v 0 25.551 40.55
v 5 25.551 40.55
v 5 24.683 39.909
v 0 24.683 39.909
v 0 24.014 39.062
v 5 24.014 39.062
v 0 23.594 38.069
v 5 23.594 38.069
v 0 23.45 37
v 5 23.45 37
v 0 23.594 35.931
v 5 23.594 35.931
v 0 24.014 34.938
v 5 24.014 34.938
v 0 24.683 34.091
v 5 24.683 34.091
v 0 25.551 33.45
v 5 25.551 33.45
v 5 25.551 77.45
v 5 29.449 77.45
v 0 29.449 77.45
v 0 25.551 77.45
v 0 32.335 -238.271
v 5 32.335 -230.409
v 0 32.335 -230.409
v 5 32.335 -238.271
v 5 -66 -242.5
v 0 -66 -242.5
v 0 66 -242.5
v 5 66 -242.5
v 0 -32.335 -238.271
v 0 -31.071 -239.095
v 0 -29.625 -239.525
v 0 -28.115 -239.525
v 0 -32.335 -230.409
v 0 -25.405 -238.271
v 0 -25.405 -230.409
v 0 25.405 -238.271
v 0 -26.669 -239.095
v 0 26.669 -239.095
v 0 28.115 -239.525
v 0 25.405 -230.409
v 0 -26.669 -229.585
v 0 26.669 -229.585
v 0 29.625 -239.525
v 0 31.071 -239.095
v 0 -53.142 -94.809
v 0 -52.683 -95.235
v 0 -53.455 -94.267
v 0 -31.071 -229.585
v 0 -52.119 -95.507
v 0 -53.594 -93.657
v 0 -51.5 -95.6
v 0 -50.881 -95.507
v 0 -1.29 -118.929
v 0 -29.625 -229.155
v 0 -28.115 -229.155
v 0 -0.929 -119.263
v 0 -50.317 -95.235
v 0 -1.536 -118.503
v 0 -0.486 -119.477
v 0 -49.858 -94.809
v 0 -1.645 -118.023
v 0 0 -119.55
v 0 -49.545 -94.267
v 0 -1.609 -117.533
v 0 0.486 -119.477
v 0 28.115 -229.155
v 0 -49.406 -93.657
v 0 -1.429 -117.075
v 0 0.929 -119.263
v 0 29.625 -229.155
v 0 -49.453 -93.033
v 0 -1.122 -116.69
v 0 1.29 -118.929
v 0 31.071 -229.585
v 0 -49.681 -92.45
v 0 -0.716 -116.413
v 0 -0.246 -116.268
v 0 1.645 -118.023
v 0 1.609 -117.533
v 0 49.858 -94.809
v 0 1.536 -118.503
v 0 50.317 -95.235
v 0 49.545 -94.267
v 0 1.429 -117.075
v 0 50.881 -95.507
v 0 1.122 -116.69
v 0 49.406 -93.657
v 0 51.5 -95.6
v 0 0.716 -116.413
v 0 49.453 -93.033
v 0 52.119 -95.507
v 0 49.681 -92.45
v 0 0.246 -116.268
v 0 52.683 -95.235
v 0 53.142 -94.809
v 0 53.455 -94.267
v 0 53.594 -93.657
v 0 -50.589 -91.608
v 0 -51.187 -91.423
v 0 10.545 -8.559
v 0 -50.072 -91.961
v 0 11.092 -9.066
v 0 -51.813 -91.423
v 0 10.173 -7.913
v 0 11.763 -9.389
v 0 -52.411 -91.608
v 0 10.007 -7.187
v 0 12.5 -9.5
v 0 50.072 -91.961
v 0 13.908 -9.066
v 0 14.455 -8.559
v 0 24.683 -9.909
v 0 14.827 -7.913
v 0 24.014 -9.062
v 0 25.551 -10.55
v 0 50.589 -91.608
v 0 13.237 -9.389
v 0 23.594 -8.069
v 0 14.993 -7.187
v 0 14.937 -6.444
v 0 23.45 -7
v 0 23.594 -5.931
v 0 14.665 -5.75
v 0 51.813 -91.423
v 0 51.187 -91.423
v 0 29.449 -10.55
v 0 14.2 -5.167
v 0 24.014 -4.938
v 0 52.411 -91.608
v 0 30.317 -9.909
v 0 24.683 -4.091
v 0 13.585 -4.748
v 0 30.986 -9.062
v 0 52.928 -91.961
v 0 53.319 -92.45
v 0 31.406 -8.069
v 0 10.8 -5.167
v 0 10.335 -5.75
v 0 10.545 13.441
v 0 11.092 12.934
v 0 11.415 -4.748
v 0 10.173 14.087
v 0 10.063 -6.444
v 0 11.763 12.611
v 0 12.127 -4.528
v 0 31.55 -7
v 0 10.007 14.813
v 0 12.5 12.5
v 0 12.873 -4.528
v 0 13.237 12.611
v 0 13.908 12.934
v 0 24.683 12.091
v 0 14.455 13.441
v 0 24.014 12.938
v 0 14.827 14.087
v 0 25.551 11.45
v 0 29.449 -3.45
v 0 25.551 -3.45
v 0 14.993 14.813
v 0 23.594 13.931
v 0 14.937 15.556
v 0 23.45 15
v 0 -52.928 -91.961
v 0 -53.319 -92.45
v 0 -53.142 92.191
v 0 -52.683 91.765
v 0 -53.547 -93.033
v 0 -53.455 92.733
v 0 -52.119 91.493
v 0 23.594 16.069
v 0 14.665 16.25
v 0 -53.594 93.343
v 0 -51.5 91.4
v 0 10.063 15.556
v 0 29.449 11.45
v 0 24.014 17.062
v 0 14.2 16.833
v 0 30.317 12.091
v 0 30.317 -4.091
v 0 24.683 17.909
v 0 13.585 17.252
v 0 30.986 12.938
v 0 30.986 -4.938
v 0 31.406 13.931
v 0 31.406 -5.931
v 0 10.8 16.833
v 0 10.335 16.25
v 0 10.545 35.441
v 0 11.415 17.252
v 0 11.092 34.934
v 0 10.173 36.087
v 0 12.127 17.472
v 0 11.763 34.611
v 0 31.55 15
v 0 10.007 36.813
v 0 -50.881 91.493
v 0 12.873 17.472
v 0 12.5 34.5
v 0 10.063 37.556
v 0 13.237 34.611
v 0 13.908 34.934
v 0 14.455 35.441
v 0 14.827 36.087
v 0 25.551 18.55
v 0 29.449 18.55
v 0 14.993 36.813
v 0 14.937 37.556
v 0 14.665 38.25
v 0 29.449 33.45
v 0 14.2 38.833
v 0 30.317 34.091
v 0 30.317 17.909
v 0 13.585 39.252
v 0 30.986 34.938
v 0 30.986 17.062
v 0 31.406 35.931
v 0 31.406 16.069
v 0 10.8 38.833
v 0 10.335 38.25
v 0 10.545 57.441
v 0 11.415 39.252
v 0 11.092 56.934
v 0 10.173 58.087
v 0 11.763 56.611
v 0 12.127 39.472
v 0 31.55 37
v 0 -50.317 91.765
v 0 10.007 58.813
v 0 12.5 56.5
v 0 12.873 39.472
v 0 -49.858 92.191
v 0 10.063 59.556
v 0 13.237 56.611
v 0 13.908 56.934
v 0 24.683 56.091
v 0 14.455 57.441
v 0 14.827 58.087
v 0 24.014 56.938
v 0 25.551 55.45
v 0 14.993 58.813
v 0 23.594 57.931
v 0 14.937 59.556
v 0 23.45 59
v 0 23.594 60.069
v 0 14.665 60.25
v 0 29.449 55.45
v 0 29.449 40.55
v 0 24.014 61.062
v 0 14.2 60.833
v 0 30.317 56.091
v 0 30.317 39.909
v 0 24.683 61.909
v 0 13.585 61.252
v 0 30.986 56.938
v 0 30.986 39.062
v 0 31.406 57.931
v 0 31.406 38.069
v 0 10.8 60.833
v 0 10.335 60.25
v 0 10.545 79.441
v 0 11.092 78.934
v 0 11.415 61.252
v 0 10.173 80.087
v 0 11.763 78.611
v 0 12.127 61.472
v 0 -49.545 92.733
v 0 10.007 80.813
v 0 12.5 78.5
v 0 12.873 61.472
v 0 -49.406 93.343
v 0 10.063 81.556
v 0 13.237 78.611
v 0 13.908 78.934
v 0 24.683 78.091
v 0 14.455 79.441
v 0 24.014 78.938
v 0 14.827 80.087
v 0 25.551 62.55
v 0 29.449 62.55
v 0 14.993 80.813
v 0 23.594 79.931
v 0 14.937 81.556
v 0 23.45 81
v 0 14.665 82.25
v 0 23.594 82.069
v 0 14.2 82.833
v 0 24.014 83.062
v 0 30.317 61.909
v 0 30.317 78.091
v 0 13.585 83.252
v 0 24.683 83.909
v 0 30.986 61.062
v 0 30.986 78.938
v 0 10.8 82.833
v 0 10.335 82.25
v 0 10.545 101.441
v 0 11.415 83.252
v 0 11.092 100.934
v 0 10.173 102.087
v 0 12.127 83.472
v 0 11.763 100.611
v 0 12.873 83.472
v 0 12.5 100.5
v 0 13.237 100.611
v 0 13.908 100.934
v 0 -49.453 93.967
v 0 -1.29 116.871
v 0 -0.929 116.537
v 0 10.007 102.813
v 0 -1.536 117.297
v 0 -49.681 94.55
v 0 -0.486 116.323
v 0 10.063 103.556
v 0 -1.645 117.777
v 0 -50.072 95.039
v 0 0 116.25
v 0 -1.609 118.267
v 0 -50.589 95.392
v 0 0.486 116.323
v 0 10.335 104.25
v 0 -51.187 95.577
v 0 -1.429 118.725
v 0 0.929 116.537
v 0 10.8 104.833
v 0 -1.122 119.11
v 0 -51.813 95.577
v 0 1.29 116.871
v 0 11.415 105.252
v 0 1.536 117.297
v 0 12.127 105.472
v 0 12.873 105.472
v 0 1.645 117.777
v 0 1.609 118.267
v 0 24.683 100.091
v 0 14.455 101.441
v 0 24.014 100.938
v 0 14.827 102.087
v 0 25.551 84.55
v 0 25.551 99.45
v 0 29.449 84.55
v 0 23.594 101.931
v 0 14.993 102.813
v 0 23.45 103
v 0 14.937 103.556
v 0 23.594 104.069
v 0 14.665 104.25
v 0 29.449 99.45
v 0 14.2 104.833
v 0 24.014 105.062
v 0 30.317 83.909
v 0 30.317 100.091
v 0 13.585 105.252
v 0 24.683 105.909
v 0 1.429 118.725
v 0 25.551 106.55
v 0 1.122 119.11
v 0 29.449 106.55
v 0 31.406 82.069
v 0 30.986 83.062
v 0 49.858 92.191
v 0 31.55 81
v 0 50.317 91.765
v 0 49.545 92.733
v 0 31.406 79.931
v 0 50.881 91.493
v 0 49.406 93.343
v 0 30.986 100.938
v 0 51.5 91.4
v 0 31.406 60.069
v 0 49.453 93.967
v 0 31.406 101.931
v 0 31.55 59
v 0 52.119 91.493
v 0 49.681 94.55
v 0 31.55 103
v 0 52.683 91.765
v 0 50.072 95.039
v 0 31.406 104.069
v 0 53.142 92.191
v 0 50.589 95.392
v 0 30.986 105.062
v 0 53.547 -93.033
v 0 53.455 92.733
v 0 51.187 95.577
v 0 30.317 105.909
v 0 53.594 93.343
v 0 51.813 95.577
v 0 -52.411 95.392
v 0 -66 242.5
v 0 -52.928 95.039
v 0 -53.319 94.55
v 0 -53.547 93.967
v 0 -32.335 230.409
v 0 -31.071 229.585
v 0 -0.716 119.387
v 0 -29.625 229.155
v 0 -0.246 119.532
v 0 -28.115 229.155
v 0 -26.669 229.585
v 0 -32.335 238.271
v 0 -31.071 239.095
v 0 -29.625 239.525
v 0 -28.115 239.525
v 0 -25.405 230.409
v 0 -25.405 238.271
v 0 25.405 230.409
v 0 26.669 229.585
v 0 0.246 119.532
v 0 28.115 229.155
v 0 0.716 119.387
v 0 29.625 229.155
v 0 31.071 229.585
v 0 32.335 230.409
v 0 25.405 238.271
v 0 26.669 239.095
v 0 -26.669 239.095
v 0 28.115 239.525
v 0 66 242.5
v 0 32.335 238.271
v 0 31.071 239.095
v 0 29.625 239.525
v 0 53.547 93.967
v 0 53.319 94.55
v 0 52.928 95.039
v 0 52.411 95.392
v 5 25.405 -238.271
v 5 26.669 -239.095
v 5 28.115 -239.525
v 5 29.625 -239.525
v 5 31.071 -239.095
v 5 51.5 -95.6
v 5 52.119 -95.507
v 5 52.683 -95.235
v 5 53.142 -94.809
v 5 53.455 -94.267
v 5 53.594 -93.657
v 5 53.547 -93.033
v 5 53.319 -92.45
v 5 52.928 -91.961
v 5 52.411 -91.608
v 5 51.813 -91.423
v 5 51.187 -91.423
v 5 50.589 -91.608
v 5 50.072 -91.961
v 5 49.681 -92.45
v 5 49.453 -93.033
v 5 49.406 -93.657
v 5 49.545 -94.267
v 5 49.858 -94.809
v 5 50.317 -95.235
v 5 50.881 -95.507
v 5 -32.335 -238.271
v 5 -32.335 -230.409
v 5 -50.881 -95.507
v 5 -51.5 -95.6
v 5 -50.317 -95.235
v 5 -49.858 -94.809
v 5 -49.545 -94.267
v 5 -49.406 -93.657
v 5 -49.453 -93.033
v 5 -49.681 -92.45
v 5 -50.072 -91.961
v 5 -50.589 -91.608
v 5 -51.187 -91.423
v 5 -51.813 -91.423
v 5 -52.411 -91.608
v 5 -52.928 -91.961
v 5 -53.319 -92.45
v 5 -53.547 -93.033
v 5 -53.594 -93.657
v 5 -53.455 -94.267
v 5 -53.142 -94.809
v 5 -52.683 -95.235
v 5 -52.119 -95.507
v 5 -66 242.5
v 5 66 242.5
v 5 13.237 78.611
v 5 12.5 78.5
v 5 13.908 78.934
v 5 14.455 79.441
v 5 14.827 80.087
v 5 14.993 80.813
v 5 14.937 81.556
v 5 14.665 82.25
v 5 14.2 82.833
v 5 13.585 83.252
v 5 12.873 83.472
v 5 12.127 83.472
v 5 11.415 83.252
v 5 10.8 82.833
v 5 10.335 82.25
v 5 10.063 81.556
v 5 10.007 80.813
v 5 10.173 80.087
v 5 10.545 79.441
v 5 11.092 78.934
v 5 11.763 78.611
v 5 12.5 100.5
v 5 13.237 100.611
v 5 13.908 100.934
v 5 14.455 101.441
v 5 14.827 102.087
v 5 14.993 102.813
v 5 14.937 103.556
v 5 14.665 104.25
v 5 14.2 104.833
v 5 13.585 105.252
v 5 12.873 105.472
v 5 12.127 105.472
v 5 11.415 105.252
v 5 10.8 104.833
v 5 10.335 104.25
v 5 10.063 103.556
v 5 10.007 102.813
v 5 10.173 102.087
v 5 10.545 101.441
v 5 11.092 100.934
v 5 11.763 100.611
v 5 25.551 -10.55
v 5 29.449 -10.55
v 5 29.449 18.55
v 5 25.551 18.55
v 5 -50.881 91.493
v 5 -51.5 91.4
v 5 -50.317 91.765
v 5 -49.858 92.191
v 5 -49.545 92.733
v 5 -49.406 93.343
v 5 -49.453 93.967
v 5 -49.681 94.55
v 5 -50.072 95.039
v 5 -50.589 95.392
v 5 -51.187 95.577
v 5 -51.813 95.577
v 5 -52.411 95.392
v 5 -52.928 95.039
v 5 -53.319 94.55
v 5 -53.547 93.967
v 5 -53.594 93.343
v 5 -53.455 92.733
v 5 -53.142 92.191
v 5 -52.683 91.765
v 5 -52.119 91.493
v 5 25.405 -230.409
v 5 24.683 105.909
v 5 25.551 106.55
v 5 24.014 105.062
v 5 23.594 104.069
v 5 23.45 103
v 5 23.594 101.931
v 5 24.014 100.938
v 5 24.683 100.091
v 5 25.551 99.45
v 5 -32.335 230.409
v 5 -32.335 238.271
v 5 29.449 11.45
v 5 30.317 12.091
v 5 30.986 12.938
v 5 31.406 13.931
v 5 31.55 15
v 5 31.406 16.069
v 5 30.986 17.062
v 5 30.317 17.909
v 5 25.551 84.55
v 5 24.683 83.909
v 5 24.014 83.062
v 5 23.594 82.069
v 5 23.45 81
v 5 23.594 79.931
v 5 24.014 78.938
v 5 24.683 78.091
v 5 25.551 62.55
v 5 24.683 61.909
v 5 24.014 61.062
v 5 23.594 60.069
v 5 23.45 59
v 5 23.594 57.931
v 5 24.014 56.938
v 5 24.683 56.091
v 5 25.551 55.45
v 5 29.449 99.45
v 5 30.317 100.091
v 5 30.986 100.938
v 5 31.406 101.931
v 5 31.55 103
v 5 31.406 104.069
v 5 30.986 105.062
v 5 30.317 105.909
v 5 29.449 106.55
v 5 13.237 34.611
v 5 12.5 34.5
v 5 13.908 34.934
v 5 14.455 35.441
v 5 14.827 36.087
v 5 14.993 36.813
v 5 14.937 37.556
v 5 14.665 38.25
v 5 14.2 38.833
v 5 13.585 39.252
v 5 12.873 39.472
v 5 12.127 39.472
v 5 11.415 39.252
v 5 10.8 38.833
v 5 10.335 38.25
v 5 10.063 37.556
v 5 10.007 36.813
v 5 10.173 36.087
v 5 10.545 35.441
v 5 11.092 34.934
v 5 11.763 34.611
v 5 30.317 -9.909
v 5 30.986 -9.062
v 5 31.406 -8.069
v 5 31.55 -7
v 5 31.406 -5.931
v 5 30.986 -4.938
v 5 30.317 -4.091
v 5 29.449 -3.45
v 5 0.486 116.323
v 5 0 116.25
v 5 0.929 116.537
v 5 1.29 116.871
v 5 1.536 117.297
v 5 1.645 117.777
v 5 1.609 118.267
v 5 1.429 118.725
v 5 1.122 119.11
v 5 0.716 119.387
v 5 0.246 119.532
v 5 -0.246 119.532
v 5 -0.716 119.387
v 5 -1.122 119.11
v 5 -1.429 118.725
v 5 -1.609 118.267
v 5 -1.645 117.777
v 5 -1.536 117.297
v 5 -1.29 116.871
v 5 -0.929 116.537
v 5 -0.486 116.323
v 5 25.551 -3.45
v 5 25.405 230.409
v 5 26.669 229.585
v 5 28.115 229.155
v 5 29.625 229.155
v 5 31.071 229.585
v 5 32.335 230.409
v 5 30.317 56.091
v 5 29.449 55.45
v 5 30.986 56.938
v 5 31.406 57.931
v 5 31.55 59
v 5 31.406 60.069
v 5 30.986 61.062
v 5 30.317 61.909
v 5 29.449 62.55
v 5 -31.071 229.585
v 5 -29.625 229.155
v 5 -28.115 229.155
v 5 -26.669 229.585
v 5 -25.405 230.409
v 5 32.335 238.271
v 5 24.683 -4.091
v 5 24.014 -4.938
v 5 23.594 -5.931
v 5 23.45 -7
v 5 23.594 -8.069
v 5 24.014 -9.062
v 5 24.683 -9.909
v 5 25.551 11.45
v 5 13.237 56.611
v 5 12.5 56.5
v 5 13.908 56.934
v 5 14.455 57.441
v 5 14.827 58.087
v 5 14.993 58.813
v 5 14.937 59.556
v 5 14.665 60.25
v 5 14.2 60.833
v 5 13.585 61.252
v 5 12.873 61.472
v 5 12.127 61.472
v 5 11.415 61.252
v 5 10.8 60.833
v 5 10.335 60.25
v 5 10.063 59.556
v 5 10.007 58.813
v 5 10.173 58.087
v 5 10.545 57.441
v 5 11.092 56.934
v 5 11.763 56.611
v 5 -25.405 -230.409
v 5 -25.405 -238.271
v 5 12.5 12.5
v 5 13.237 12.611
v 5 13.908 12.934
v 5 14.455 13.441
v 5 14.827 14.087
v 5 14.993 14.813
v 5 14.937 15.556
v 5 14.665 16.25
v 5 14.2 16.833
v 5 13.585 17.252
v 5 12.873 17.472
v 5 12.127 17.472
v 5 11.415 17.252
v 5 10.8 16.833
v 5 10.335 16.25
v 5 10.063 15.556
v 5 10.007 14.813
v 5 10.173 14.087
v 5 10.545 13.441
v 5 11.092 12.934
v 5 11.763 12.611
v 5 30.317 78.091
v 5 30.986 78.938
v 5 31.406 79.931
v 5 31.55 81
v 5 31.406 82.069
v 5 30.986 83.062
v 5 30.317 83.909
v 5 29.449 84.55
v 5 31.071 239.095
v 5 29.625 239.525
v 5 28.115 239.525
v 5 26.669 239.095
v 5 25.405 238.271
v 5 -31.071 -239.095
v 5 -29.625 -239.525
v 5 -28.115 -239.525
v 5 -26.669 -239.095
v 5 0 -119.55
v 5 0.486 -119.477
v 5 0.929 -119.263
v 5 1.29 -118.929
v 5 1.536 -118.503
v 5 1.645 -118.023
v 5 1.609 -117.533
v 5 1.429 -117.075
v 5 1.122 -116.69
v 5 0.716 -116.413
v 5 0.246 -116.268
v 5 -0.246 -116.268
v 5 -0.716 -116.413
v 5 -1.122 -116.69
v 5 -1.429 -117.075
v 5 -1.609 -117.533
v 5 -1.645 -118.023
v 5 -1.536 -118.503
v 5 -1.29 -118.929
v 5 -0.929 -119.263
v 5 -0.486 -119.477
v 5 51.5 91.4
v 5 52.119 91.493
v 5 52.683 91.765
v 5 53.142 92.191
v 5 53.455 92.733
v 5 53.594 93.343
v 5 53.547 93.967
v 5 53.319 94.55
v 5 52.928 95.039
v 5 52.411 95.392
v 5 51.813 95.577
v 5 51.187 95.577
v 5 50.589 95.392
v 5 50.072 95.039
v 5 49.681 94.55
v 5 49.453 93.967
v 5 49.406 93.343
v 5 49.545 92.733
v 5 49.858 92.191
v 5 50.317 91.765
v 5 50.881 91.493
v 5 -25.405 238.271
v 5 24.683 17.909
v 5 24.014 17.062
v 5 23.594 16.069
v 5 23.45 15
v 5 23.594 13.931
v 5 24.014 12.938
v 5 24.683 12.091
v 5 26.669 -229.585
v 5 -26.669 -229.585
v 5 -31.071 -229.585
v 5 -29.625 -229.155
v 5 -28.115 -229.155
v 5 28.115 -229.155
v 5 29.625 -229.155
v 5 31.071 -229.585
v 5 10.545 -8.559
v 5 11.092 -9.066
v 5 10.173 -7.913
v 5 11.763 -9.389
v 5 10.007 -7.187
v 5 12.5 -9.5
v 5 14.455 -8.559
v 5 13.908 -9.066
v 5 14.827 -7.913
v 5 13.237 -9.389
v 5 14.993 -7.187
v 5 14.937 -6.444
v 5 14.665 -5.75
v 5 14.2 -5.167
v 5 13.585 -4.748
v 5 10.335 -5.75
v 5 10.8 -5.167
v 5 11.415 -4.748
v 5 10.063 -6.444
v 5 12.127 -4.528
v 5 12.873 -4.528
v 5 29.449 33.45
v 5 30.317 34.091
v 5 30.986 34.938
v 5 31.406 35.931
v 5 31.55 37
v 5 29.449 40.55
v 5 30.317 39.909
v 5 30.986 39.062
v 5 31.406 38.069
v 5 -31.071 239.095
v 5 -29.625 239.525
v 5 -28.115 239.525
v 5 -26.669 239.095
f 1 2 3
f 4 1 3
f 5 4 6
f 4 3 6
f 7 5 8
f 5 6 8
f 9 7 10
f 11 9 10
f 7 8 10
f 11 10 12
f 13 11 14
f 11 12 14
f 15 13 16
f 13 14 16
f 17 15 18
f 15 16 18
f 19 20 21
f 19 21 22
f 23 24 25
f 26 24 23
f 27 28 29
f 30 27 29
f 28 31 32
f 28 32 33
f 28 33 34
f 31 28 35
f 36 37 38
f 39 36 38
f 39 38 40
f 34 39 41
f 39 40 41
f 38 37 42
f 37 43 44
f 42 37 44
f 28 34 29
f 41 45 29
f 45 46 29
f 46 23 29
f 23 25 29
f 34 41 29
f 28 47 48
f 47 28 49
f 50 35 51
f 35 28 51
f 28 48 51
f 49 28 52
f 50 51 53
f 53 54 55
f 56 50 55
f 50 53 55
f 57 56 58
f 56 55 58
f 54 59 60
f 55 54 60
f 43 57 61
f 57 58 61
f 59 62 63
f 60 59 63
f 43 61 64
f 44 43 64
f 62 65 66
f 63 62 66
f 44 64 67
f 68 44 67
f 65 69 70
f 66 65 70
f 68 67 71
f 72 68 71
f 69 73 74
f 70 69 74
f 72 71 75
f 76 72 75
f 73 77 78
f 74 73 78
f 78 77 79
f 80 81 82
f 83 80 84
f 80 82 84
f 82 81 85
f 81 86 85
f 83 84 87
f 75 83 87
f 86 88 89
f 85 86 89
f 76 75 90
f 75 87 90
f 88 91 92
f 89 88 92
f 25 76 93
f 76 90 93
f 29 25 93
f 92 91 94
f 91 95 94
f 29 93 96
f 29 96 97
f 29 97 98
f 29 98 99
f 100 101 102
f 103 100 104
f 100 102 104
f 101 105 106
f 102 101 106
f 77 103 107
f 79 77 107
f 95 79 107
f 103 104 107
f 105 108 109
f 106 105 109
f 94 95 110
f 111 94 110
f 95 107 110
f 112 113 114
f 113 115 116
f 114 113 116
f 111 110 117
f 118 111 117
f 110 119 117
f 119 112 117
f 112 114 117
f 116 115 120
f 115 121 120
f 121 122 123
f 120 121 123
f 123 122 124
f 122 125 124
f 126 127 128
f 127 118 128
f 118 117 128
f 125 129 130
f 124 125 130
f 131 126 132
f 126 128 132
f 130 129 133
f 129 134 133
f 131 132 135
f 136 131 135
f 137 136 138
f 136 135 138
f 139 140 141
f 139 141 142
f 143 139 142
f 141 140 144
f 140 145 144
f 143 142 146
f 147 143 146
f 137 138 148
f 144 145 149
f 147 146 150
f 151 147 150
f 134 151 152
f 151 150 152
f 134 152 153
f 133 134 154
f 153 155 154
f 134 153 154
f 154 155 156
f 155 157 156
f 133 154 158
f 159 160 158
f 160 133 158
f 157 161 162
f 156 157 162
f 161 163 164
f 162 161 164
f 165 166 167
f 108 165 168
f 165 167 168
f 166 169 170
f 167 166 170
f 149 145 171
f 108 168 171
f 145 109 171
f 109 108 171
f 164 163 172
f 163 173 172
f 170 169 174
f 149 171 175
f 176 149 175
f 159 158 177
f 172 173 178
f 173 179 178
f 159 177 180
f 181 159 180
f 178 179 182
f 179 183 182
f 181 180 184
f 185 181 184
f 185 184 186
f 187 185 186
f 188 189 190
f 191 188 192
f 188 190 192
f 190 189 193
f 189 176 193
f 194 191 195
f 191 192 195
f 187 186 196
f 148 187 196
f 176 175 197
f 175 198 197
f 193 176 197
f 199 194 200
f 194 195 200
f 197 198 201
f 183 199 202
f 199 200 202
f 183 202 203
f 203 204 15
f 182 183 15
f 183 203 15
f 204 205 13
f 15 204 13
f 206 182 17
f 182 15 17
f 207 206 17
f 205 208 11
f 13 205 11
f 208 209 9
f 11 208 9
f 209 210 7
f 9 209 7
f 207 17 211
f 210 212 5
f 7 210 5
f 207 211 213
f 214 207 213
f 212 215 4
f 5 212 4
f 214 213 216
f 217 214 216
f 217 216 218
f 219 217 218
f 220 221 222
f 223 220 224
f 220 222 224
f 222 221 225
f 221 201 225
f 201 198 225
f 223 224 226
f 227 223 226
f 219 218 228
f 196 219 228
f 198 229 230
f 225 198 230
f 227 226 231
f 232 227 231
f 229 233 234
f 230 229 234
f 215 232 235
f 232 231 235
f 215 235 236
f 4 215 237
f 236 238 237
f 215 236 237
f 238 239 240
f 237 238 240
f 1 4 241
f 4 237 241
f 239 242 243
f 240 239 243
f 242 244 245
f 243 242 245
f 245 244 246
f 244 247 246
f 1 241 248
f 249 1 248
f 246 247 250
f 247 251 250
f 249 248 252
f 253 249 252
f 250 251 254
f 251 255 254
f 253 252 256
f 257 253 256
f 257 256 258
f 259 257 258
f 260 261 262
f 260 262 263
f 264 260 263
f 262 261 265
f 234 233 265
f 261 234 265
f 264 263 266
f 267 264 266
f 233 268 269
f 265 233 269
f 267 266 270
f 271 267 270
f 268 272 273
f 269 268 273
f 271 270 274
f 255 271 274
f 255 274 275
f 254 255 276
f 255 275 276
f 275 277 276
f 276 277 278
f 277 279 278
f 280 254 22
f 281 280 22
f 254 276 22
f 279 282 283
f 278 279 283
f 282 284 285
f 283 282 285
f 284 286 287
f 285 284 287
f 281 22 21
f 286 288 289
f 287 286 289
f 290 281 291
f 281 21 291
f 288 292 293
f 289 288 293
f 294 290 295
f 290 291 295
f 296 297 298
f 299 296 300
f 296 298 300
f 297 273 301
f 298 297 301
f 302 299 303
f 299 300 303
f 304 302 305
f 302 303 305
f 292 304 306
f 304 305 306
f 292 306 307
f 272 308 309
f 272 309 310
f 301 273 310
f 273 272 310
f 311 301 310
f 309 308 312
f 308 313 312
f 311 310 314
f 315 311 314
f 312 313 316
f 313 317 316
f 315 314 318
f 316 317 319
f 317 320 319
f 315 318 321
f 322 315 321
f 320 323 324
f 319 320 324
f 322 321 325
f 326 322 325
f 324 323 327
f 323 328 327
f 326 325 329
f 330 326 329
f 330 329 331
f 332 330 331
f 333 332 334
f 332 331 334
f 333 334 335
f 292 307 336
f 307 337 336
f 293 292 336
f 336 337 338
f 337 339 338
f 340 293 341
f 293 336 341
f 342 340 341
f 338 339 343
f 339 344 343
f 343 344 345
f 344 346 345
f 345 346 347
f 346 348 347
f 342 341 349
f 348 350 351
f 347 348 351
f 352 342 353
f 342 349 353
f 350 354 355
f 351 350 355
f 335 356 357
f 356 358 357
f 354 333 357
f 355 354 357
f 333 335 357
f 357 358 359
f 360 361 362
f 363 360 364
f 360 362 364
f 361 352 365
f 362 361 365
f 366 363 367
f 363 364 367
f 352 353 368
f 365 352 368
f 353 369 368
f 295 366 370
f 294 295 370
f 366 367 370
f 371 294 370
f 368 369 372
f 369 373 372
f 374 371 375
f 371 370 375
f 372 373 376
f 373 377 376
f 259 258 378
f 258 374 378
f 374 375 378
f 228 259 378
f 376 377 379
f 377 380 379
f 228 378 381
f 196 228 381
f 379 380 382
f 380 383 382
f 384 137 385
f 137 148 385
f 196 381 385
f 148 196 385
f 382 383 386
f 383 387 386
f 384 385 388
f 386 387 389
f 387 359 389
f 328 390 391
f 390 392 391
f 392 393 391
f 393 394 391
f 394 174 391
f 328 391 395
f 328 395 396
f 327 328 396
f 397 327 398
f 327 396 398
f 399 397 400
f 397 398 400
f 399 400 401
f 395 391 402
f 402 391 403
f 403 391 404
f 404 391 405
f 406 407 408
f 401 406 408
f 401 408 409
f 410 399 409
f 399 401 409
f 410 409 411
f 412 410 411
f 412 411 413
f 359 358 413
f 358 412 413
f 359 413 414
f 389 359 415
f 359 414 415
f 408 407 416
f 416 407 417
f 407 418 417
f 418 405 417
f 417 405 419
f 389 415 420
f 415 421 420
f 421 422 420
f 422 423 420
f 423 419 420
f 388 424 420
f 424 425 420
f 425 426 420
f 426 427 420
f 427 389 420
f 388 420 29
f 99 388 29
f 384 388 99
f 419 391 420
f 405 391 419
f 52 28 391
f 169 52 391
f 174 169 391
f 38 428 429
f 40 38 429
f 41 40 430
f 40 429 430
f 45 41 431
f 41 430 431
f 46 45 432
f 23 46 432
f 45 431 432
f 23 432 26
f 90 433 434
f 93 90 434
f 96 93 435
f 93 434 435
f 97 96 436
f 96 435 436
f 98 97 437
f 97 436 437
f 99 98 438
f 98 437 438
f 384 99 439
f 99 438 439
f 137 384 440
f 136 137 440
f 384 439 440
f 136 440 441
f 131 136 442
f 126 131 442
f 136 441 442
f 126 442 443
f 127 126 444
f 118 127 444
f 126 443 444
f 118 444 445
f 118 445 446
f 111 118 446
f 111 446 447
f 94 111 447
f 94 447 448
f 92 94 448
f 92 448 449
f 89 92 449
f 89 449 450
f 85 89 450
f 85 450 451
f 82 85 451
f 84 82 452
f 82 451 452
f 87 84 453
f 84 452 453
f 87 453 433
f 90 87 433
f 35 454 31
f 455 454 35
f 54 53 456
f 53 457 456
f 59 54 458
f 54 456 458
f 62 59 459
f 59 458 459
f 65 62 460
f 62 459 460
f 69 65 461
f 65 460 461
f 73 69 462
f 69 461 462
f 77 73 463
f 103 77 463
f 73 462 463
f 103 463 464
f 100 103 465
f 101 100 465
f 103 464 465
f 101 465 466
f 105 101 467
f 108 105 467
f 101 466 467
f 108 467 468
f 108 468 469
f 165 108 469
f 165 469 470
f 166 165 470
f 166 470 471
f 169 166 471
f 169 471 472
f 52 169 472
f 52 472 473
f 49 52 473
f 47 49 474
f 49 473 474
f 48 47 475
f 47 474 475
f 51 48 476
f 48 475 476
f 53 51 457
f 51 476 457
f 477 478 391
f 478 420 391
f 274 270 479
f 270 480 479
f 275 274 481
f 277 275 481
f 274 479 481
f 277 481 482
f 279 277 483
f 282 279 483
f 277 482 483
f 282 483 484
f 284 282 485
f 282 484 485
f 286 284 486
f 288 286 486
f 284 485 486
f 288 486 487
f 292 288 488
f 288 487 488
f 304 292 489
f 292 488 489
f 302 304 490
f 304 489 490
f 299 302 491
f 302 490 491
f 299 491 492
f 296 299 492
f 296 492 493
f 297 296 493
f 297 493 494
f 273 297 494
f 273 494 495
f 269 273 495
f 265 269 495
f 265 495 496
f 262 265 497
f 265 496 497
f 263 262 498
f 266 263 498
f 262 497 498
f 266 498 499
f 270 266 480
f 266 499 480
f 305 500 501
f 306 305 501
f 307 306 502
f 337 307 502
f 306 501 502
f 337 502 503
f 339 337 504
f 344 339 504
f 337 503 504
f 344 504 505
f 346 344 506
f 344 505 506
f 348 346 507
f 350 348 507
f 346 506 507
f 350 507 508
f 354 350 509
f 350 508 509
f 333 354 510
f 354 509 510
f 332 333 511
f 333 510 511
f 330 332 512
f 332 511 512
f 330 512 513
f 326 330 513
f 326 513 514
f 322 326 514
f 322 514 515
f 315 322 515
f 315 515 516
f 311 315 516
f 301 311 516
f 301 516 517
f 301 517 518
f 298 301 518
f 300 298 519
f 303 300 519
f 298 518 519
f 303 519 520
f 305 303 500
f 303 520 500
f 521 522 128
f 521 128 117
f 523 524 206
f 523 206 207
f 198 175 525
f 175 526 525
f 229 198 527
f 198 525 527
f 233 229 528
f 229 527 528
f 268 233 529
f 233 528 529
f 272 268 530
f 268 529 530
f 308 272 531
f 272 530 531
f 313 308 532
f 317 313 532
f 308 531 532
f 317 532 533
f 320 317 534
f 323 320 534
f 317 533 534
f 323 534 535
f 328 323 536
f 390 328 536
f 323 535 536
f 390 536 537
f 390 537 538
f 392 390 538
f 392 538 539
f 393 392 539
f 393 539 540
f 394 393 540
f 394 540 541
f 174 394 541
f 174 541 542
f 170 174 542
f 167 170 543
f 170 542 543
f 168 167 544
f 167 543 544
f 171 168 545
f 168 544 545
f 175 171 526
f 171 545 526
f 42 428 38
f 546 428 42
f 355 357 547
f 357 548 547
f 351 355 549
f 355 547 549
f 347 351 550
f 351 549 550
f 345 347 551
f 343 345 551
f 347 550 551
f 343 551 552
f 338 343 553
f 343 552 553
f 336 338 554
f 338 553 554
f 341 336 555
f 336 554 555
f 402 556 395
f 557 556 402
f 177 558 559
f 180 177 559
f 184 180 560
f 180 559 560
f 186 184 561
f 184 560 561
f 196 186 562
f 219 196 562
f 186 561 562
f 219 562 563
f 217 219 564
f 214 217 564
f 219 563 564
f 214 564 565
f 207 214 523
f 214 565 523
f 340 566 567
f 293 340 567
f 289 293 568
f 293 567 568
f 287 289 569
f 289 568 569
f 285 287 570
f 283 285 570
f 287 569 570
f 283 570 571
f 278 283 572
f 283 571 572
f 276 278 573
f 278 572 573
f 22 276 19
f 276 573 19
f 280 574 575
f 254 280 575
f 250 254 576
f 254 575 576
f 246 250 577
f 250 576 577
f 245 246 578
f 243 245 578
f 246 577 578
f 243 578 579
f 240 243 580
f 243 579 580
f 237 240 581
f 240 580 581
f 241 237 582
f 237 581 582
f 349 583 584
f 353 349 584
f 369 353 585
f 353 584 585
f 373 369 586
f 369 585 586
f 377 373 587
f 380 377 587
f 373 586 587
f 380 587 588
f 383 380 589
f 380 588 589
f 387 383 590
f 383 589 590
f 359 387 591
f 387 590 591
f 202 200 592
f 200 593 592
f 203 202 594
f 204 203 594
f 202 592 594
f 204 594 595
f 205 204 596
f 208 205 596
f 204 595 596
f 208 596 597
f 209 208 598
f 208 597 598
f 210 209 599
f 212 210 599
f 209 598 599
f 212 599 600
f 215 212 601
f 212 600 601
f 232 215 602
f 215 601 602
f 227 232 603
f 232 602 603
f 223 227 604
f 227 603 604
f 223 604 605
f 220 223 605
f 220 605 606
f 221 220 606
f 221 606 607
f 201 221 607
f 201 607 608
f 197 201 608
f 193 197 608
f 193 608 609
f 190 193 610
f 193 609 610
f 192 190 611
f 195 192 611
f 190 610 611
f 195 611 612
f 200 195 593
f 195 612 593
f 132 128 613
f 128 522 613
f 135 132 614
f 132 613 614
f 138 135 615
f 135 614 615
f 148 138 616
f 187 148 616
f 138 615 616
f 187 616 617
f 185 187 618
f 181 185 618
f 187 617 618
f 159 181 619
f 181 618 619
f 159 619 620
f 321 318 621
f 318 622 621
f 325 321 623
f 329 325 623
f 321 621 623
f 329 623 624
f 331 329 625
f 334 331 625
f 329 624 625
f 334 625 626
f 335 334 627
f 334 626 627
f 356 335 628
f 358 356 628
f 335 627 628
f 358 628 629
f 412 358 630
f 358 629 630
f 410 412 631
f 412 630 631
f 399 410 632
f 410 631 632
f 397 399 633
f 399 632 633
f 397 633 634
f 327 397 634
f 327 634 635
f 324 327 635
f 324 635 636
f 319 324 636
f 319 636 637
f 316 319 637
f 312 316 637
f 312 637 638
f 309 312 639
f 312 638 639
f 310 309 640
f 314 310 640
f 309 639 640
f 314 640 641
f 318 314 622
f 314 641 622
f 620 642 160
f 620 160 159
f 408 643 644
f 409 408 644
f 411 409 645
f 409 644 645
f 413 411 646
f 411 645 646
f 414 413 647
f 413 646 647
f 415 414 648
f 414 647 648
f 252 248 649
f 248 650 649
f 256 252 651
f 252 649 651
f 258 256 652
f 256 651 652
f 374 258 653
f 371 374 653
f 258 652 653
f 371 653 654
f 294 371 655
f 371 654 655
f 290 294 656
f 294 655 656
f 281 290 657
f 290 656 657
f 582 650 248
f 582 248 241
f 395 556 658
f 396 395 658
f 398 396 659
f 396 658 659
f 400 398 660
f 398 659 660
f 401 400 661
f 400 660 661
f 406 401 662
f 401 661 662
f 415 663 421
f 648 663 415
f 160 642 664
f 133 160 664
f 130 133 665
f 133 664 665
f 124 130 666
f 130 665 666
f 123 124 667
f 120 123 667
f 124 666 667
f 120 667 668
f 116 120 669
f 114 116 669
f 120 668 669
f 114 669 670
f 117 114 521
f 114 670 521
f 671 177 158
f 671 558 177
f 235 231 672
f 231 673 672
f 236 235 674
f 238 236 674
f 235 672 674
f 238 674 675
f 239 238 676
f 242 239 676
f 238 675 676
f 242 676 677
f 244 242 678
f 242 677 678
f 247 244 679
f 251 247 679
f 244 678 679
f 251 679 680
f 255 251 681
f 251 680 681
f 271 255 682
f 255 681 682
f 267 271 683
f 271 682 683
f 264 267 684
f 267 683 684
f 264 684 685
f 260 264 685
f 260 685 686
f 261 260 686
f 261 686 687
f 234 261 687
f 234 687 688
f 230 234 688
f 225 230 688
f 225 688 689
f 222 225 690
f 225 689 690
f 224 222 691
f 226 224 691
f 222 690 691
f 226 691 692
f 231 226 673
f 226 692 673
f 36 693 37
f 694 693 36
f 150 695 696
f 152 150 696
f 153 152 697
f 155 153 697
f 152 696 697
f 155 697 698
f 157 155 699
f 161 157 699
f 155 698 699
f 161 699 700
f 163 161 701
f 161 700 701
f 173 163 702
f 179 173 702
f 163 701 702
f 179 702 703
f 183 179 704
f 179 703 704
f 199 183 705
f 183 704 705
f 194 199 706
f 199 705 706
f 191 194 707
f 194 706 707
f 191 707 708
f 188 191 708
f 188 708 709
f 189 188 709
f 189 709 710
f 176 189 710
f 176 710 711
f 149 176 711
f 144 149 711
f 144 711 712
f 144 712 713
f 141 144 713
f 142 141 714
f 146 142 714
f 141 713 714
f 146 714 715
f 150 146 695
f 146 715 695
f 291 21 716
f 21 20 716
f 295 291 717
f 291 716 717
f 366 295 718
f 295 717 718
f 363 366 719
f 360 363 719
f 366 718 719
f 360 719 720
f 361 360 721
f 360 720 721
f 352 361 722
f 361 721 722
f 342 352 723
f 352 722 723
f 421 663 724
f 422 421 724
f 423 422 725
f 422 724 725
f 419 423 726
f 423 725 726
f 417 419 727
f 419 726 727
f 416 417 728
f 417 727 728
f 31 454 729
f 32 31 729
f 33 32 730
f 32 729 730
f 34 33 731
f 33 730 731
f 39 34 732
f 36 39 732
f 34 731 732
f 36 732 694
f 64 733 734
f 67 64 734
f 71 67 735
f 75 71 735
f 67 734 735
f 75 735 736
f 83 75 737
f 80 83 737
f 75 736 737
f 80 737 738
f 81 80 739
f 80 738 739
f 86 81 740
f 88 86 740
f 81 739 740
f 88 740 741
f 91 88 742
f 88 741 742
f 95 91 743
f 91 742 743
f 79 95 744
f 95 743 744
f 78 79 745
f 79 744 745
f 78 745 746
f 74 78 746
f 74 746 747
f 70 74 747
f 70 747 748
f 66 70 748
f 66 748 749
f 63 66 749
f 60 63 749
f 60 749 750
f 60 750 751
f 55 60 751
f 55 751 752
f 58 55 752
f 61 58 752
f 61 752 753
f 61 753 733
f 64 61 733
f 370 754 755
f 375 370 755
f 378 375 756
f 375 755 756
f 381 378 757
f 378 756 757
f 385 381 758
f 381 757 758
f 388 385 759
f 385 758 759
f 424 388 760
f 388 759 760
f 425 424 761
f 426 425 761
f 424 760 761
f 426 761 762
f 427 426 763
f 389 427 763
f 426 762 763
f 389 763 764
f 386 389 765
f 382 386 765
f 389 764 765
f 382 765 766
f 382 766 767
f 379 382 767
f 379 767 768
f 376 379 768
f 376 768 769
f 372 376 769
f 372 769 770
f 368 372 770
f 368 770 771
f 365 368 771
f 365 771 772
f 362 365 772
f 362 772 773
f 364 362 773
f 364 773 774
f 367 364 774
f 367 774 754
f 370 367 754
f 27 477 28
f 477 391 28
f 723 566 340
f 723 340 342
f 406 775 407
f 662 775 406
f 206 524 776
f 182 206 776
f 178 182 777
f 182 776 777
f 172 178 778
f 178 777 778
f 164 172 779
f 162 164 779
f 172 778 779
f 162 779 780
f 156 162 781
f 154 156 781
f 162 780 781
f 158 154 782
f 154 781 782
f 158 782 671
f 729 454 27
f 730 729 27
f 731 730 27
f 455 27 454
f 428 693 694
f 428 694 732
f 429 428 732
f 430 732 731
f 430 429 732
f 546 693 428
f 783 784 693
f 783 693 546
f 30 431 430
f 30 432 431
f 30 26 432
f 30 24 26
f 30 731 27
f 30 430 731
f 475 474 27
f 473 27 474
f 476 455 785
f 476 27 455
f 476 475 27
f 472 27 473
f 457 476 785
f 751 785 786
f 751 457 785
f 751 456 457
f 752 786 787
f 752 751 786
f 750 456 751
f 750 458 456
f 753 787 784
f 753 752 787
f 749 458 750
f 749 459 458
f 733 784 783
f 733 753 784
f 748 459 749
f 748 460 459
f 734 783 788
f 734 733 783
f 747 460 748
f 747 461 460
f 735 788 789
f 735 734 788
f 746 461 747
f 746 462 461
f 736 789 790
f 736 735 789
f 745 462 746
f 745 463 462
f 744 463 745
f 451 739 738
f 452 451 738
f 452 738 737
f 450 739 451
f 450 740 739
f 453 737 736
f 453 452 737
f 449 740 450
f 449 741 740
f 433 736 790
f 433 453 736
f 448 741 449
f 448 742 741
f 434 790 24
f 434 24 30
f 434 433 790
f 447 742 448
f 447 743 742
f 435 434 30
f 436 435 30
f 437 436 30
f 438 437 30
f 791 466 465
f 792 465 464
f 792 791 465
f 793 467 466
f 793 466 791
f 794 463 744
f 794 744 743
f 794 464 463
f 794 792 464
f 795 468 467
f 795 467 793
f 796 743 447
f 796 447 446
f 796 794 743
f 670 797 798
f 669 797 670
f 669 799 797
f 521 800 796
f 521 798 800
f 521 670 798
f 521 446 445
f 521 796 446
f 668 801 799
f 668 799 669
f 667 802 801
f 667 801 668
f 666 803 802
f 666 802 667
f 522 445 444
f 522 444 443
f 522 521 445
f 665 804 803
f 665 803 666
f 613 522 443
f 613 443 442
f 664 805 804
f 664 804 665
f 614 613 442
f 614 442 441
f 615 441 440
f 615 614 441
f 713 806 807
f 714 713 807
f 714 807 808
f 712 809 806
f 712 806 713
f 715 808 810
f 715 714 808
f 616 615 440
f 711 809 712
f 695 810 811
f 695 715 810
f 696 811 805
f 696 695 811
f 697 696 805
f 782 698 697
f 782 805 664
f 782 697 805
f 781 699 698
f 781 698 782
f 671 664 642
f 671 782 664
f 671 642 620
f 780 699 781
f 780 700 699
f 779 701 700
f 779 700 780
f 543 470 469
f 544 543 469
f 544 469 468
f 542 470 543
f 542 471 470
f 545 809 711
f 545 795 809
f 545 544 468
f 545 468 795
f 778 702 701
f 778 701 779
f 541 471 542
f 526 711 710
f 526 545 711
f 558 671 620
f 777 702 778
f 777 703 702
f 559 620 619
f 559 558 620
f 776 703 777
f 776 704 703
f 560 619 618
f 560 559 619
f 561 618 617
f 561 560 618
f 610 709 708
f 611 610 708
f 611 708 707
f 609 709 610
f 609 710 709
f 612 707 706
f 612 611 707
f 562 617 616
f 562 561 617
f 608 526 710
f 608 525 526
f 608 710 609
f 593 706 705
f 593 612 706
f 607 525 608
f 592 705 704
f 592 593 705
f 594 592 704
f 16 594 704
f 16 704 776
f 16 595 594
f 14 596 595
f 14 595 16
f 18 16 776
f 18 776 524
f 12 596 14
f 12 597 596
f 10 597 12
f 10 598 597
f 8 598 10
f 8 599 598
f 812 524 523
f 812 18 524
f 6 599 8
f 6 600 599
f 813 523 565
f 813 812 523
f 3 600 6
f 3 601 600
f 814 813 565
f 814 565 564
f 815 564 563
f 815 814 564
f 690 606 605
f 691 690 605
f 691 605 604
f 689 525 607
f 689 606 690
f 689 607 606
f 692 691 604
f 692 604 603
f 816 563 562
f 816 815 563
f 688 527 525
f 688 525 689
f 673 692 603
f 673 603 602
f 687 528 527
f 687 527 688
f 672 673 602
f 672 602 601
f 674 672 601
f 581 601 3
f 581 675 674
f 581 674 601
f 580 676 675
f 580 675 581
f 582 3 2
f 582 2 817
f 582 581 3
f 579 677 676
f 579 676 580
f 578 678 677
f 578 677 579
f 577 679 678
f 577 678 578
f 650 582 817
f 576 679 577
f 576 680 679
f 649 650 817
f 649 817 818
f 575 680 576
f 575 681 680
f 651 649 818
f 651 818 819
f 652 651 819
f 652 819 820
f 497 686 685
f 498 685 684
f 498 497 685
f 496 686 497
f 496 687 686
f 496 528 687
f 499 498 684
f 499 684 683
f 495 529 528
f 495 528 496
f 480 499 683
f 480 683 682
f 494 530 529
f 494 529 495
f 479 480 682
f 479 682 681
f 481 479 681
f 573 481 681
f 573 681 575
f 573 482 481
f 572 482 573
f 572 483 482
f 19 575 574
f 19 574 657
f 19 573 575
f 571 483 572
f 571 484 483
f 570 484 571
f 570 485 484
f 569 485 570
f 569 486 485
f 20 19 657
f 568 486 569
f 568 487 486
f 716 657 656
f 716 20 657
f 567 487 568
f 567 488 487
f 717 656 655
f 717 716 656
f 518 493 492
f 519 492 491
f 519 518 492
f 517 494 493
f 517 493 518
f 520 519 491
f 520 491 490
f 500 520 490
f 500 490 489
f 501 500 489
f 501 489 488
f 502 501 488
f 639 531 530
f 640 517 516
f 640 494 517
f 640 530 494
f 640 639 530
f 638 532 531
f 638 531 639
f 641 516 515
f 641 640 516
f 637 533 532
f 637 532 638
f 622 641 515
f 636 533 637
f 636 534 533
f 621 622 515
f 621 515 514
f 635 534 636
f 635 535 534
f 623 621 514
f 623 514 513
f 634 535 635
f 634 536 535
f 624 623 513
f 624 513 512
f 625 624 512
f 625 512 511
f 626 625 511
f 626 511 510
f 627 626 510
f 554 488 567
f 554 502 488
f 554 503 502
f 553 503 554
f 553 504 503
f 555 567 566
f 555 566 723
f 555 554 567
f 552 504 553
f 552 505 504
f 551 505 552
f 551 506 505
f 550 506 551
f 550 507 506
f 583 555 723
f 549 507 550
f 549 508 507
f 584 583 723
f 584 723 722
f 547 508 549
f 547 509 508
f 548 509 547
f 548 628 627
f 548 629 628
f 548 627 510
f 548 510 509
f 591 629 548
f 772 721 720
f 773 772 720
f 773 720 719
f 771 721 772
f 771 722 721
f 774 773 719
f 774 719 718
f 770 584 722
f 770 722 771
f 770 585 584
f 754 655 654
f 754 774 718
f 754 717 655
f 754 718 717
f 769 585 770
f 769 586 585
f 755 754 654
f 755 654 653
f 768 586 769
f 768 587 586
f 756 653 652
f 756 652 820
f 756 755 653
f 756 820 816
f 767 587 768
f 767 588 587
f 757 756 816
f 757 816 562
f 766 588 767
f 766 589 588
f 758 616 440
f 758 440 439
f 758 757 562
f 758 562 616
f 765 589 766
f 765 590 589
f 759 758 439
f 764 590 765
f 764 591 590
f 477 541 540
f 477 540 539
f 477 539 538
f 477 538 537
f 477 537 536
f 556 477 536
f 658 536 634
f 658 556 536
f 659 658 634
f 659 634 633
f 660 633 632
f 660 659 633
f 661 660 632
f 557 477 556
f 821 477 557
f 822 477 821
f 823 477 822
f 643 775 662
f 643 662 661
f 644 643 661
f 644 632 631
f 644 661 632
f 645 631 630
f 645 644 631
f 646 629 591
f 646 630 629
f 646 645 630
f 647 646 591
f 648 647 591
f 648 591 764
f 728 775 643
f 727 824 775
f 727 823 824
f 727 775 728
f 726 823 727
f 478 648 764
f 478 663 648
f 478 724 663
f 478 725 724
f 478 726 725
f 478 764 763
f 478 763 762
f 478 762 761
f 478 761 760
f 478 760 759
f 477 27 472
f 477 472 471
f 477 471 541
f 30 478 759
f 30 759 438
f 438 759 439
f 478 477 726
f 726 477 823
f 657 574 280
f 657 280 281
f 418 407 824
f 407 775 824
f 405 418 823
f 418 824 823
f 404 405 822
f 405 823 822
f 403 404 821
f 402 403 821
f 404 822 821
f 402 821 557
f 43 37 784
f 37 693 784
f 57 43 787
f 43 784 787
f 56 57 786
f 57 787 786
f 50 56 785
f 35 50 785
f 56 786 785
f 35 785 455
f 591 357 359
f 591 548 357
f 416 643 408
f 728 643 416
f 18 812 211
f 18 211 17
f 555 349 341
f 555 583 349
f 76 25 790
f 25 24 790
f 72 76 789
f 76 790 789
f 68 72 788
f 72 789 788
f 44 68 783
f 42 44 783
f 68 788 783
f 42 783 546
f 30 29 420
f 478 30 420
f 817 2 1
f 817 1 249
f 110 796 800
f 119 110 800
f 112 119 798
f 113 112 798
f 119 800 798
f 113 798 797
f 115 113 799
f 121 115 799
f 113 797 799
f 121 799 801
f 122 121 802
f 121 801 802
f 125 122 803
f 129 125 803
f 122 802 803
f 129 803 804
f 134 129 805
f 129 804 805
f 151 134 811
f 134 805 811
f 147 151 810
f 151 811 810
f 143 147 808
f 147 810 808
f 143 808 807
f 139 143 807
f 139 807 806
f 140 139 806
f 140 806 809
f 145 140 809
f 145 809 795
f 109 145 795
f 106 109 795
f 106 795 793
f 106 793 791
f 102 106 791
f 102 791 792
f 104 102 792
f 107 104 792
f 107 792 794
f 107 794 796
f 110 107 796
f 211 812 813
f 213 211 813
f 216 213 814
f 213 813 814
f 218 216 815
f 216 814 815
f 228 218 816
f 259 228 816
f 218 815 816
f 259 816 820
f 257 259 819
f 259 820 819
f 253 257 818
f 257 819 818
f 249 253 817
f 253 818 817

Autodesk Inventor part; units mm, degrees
ref_plane "YZ Plane" through (0, 0, 0) normal (1, 0, 0) x (0, 1, 0)
ref_plane "XZ Plane" through (0, 0, 0) normal (0, 1, 0) x (-1, 0, 0)
ref_plane "XY Plane" through (0, 0, 0) normal (0, 0, 1) x (1, 0, 0)
sketch "Sketch1" plane through (0, 0, 0) normal (1, 0, 0) x (0, 1, 0)
  line L0 (-66, -242.5) -> (66, -242.5)
  line L1 (66, -242.5) -> (66, 242.5)
  line L2 (66, 242.5) -> (-66, 242.5)
  line L3 (-66, 242.5) -> (-66, -242.5)
  line L4 (-66, -242.5) -> (66, 242.5) construction
  line L5 (66, -242.5) -> (-66, 242.5) construction
  point P0 (0, 0)
  dimension "d0" = 132
  dimension "d1" = 485
extrude "Extrusion1" add sketch "Sketch1" along normal blind 5
sketch "Sketch2" plane through (5, 0, 0) normal (1, 0, 0) x (0, 0, -1)
  line L0 (-242.5, -66) -> (242.5, -66) projected
  line L1 (-242.5, 66) -> (-242.5, -66) projected
  line L2 (0, 66) -> (0, -66) construction
  line L3 (-242.5, 0) -> (242.5, 0) construction
  line L4 (-230.4092, -32.335) -> (-238.2708, -32.335)
  line L5 (-238.2708, -25.405) -> (-230.4092, -25.405)
  line L6 (-230.4092, -32.335) -> (-238.2708, -25.405) construction
  line L7 (-238.2708, -32.335) -> (-230.4092, -25.405) construction
  arc A0 (-238.2708, -25.405) -> (-238.2708, -32.335) centre (-234.34, -28.87) ccw
  arc A1 (-230.4092, -32.335) -> (-230.4092, -25.405) centre (-234.34, -28.87) ccw
  line L8 (238.2708, -32.335) -> (230.4092, -32.335)
  line L9 (230.4092, -25.405) -> (238.2708, -25.405)
  line L10 (238.2708, -32.335) -> (230.4092, -25.405) construction
  line L11 (230.4092, -32.335) -> (238.2708, -25.405) construction
  arc A2 (230.4092, -25.405) -> (230.4092, -32.335) centre (234.34, -28.87) ccw
  arc A3 (238.2708, -32.335) -> (238.2708, -25.405) centre (234.34, -28.87) ccw
  line L12 (-230.4092, 25.405) -> (-238.2708, 25.405)
  line L13 (-238.2708, 32.335) -> (-230.4092, 32.335)
  line L14 (-230.4092, 25.405) -> (-238.2708, 32.335) construction
  line L15 (-238.2708, 25.405) -> (-230.4092, 32.335) construction
  arc A4 (-238.2708, 32.335) -> (-238.2708, 25.405) centre (-234.34, 28.87) ccw
  arc A5 (-230.4092, 25.405) -> (-230.4092, 32.335) centre (-234.34, 28.87) ccw
  line L16 (238.2708, 25.405) -> (230.4092, 25.405)
  line L17 (230.4092, 32.335) -> (238.2708, 32.335)
  line L18 (238.2708, 25.405) -> (230.4092, 32.335) construction
  line L19 (230.4092, 25.405) -> (238.2708, 32.335) construction
  arc A6 (230.4092, 32.335) -> (230.4092, 25.405) centre (234.34, 28.87) ccw
  arc A7 (238.2708, 25.405) -> (238.2708, 32.335) centre (234.34, 28.87) ccw
  line L20 (121, -42.5) -> (-121, -42.5)
  line L21 (-121, -42.5) -> (-121, 42.5)
  line L22 (-121, 42.5) -> (121, 42.5)
  line L23 (121, 42.5) -> (121, -42.5)
  line L24 (121, -42.5) -> (-121, 42.5) construction
  line L25 (-121, -42.5) -> (121, 42.5) construction
  circle A8 centre (-117.9, 0) radius 1.65
  line L26 (-6.7, 0) -> (478.3, 0) construction
  circle A9 centre (117.9, 0) radius 1.65
  circle A10 centre (-103, 12.5) radius 2.5
  line L27 (-106.55, 25.5506) -> (-106.55, 29.4494)
  line L28 (-99.45, 29.4494) -> (-99.45, 25.5506)
  line L29 (-99.45, 25.5506) -> (-106.55, 29.4494) construction
  line L30 (-106.55, 25.5506) -> (-99.45, 29.4494) construction
  arc A11 (-106.55, 25.5506) -> (-99.45, 25.5506) centre (-103, 27.5) ccw
  arc A12 (-99.45, 29.4494) -> (-106.55, 29.4494) centre (-103, 27.5) ccw
  line L31 (-220.5, 0) -> (264.5, 0) construction
  line L32 (143, -42.5) -> (-99, 42.5) construction
  circle A13 centre (-81, 12.5) radius 2.5
  arc A14 (-77.45, 29.4494) -> (-84.55, 29.4494) centre (-81, 27.5) ccw
  arc A15 (-84.55, 25.5506) -> (-77.45, 25.5506) centre (-81, 27.5) ccw
  line L33 (-84.55, 25.5506) -> (-84.55, 29.4494)
  line L34 (-77.45, 29.4494) -> (-77.45, 25.5506)
  line L35 (-84.55, 25.5506) -> (-77.45, 29.4494) construction
  line L36 (-77.45, 25.5506) -> (-84.55, 29.4494) construction
  line L37 (-198.5, 0) -> (286.5, 0) construction
  line L38 (165, -42.5) -> (-77, 42.5) construction
  circle A16 centre (-59, 12.5) radius 2.5
  arc A17 (-55.45, 29.4494) -> (-62.55, 29.4494) centre (-59, 27.5) ccw
  arc A18 (-62.55, 25.5506) -> (-55.45, 25.5506) centre (-59, 27.5) ccw
  line L39 (-62.55, 25.5506) -> (-62.55, 29.4494)
  line L40 (-55.45, 29.4494) -> (-55.45, 25.5506)
  line L41 (-62.55, 25.5506) -> (-55.45, 29.4494) construction
  line L42 (-55.45, 25.5506) -> (-62.55, 29.4494) construction
  line L43 (-176.5, 0) -> (308.5, 0) construction
  line L44 (187, -42.5) -> (-55, 42.5) construction
  circle A19 centre (-37, 12.5) radius 2.5
  arc A20 (-33.45, 29.4494) -> (-40.55, 29.4494) centre (-37, 27.5) ccw
  arc A21 (-40.55, 25.5506) -> (-33.45, 25.5506) centre (-37, 27.5) ccw
  line L45 (-40.55, 25.5506) -> (-40.55, 29.4494)
  line L46 (-33.45, 29.4494) -> (-33.45, 25.5506)
  line L47 (-40.55, 25.5506) -> (-33.45, 29.4494) construction
  line L48 (-33.45, 25.5506) -> (-40.55, 29.4494) construction
  line L49 (-154.5, 0) -> (330.5, 0) construction
  line L50 (209, -42.5) -> (-33, 42.5) construction
  circle A22 centre (-15, 12.5) radius 2.5
  arc A23 (-11.45, 29.4494) -> (-18.55, 29.4494) centre (-15, 27.5) ccw
  arc A24 (-18.55, 25.5506) -> (-11.45, 25.5506) centre (-15, 27.5) ccw
  line L51 (-18.55, 25.5506) -> (-18.55, 29.4494)
  line L52 (-11.45, 29.4494) -> (-11.45, 25.5506)
  line L53 (-18.55, 25.5506) -> (-11.45, 29.4494) construction
  line L54 (-11.45, 25.5506) -> (-18.55, 29.4494) construction
  line L55 (-132.5, 0) -> (352.5, 0) construction
  line L56 (231, -42.5) -> (-11, 42.5) construction
  circle A25 centre (7, 12.5) radius 2.5
  arc A26 (10.55, 29.4494) -> (3.45, 29.4494) centre (7, 27.5) ccw
  arc A27 (3.45, 25.5506) -> (10.55, 25.5506) centre (7, 27.5) ccw
  line L57 (3.45, 25.5506) -> (3.45, 29.4494)
  line L58 (10.55, 29.4494) -> (10.55, 25.5506)
  line L59 (3.45, 25.5506) -> (10.55, 29.4494) construction
  line L60 (10.55, 25.5506) -> (3.45, 29.4494) construction
  arc A28 (-121, 42.5) -> (-121, -42.5) centre (329.563, 0) ccw
  arc A29 (121, -42.5) -> (121, 42.5) centre (-329.563, 0) ccw
  line L61 (93.5, 43.5) -> (-93.5, 43.5)
  line L62 (-93.5, 43.5) -> (-93.5, 58.58)
  line L63 (-93.5, 58.58) -> (93.5, 58.58)
  line L64 (93.5, 58.58) -> (93.5, 43.5)
  line L65 (93.5, 43.5) -> (-93.5, 58.58) construction
  line L66 (-93.5, 43.5) -> (93.5, 58.58) construction
  line L67 (242.5, 66) -> (-242.5, 66) projected
  circle A30 centre (93.5, 51.5) radius 2.1
  circle A31 centre (-93.5, 51.5) radius 2.1
  line L68 (93.5, -58.58) -> (-93.5, -58.58)
  line L69 (-93.5, -58.58) -> (-93.5, -43.5)
  line L70 (-93.5, -43.5) -> (93.5, -43.5)
  line L71 (93.5, -43.5) -> (93.5, -58.58)
  line L72 (93.5, -58.58) -> (-93.5, -43.5) construction
  line L73 (-93.5, -58.58) -> (93.5, -43.5) construction
  circle A32 centre (93.5, -51.5) radius 2.1
  circle A33 centre (-93.5, -51.5) radius 2.1
  point P0 (0, 0)
  point P1 (-103, 27.5)
  point P2 (-81, 27.5)
  point P3 (-59, 27.5)
  point P4 (-37, 27.5)
  point P5 (-15, 27.5)
  point P6 (7, 27.5)
  point P7 (0, 51.04)
  point P8 (0, -51.04)
  dimension "d7" = 28.87
  dimension "d10" = 234.34
  dimension "d11" = 5.24
  dimension "d12" = 6.93
  dimension "d15" = 468.68
  dimension "d18" = 57.74
  dimension "d21" = 242
  dimension "d22" = 85
  dimension "d23" = 117.9
  dimension "d24" = 42.5
  dimension "d25" = 3.3
  dimension "d28" = 235.8
  dimension "d33" = 117.9
  dimension "d35" = 5
  dimension "d37" = 15
  dimension "d38" = 18
  dimension "d39" = 15
  dimension "d40" = 4.05
  dimension "d41" = 7.1
  dimension "d44" = 22
  dimension "d51" = 452.563
  dimension "d52" = 452.563
  dimension "d53" = 7.42
  dimension "d54" = 15.08
  dimension "d55" = 187
  dimension "d56" = 4.2
  dimension "d57" = 8
  dimension "d58" = 4.2
  dimension "d59" = 8
  dimension "d72" = 15.08
  dimension "d73" = 187
  dimension "d74" = 4.2
  dimension "d76" = 4.2
  dimension "d78" = 7.42
  dimension "d79" = 8
  dimension "d80" = 8
extrude "Extrusion2" cut sketch "Sketch2" against normal blind 5 contours L4 A0 L5 A1 | L8 A2 L9 A3 | L12 A4 L13 A5 | L16 A6 L17 A7 | A8 | A9 | A10 | L27 A12 L28 A11 | A13 | L34 A15 L33 A14 | A16 | L40 A18 L39 A17 | A19 | L46 A21 L45 A20 | A22 | L52 A24 L51 A23 | A25 | L58 A27 L57 A26 | A30 L64 | L64 A30 | A31 L62 | L62 A31 | A32 L71 | L71 A32 | A33 L69 | L69 A33
properties part number "Large_frontplatte"
